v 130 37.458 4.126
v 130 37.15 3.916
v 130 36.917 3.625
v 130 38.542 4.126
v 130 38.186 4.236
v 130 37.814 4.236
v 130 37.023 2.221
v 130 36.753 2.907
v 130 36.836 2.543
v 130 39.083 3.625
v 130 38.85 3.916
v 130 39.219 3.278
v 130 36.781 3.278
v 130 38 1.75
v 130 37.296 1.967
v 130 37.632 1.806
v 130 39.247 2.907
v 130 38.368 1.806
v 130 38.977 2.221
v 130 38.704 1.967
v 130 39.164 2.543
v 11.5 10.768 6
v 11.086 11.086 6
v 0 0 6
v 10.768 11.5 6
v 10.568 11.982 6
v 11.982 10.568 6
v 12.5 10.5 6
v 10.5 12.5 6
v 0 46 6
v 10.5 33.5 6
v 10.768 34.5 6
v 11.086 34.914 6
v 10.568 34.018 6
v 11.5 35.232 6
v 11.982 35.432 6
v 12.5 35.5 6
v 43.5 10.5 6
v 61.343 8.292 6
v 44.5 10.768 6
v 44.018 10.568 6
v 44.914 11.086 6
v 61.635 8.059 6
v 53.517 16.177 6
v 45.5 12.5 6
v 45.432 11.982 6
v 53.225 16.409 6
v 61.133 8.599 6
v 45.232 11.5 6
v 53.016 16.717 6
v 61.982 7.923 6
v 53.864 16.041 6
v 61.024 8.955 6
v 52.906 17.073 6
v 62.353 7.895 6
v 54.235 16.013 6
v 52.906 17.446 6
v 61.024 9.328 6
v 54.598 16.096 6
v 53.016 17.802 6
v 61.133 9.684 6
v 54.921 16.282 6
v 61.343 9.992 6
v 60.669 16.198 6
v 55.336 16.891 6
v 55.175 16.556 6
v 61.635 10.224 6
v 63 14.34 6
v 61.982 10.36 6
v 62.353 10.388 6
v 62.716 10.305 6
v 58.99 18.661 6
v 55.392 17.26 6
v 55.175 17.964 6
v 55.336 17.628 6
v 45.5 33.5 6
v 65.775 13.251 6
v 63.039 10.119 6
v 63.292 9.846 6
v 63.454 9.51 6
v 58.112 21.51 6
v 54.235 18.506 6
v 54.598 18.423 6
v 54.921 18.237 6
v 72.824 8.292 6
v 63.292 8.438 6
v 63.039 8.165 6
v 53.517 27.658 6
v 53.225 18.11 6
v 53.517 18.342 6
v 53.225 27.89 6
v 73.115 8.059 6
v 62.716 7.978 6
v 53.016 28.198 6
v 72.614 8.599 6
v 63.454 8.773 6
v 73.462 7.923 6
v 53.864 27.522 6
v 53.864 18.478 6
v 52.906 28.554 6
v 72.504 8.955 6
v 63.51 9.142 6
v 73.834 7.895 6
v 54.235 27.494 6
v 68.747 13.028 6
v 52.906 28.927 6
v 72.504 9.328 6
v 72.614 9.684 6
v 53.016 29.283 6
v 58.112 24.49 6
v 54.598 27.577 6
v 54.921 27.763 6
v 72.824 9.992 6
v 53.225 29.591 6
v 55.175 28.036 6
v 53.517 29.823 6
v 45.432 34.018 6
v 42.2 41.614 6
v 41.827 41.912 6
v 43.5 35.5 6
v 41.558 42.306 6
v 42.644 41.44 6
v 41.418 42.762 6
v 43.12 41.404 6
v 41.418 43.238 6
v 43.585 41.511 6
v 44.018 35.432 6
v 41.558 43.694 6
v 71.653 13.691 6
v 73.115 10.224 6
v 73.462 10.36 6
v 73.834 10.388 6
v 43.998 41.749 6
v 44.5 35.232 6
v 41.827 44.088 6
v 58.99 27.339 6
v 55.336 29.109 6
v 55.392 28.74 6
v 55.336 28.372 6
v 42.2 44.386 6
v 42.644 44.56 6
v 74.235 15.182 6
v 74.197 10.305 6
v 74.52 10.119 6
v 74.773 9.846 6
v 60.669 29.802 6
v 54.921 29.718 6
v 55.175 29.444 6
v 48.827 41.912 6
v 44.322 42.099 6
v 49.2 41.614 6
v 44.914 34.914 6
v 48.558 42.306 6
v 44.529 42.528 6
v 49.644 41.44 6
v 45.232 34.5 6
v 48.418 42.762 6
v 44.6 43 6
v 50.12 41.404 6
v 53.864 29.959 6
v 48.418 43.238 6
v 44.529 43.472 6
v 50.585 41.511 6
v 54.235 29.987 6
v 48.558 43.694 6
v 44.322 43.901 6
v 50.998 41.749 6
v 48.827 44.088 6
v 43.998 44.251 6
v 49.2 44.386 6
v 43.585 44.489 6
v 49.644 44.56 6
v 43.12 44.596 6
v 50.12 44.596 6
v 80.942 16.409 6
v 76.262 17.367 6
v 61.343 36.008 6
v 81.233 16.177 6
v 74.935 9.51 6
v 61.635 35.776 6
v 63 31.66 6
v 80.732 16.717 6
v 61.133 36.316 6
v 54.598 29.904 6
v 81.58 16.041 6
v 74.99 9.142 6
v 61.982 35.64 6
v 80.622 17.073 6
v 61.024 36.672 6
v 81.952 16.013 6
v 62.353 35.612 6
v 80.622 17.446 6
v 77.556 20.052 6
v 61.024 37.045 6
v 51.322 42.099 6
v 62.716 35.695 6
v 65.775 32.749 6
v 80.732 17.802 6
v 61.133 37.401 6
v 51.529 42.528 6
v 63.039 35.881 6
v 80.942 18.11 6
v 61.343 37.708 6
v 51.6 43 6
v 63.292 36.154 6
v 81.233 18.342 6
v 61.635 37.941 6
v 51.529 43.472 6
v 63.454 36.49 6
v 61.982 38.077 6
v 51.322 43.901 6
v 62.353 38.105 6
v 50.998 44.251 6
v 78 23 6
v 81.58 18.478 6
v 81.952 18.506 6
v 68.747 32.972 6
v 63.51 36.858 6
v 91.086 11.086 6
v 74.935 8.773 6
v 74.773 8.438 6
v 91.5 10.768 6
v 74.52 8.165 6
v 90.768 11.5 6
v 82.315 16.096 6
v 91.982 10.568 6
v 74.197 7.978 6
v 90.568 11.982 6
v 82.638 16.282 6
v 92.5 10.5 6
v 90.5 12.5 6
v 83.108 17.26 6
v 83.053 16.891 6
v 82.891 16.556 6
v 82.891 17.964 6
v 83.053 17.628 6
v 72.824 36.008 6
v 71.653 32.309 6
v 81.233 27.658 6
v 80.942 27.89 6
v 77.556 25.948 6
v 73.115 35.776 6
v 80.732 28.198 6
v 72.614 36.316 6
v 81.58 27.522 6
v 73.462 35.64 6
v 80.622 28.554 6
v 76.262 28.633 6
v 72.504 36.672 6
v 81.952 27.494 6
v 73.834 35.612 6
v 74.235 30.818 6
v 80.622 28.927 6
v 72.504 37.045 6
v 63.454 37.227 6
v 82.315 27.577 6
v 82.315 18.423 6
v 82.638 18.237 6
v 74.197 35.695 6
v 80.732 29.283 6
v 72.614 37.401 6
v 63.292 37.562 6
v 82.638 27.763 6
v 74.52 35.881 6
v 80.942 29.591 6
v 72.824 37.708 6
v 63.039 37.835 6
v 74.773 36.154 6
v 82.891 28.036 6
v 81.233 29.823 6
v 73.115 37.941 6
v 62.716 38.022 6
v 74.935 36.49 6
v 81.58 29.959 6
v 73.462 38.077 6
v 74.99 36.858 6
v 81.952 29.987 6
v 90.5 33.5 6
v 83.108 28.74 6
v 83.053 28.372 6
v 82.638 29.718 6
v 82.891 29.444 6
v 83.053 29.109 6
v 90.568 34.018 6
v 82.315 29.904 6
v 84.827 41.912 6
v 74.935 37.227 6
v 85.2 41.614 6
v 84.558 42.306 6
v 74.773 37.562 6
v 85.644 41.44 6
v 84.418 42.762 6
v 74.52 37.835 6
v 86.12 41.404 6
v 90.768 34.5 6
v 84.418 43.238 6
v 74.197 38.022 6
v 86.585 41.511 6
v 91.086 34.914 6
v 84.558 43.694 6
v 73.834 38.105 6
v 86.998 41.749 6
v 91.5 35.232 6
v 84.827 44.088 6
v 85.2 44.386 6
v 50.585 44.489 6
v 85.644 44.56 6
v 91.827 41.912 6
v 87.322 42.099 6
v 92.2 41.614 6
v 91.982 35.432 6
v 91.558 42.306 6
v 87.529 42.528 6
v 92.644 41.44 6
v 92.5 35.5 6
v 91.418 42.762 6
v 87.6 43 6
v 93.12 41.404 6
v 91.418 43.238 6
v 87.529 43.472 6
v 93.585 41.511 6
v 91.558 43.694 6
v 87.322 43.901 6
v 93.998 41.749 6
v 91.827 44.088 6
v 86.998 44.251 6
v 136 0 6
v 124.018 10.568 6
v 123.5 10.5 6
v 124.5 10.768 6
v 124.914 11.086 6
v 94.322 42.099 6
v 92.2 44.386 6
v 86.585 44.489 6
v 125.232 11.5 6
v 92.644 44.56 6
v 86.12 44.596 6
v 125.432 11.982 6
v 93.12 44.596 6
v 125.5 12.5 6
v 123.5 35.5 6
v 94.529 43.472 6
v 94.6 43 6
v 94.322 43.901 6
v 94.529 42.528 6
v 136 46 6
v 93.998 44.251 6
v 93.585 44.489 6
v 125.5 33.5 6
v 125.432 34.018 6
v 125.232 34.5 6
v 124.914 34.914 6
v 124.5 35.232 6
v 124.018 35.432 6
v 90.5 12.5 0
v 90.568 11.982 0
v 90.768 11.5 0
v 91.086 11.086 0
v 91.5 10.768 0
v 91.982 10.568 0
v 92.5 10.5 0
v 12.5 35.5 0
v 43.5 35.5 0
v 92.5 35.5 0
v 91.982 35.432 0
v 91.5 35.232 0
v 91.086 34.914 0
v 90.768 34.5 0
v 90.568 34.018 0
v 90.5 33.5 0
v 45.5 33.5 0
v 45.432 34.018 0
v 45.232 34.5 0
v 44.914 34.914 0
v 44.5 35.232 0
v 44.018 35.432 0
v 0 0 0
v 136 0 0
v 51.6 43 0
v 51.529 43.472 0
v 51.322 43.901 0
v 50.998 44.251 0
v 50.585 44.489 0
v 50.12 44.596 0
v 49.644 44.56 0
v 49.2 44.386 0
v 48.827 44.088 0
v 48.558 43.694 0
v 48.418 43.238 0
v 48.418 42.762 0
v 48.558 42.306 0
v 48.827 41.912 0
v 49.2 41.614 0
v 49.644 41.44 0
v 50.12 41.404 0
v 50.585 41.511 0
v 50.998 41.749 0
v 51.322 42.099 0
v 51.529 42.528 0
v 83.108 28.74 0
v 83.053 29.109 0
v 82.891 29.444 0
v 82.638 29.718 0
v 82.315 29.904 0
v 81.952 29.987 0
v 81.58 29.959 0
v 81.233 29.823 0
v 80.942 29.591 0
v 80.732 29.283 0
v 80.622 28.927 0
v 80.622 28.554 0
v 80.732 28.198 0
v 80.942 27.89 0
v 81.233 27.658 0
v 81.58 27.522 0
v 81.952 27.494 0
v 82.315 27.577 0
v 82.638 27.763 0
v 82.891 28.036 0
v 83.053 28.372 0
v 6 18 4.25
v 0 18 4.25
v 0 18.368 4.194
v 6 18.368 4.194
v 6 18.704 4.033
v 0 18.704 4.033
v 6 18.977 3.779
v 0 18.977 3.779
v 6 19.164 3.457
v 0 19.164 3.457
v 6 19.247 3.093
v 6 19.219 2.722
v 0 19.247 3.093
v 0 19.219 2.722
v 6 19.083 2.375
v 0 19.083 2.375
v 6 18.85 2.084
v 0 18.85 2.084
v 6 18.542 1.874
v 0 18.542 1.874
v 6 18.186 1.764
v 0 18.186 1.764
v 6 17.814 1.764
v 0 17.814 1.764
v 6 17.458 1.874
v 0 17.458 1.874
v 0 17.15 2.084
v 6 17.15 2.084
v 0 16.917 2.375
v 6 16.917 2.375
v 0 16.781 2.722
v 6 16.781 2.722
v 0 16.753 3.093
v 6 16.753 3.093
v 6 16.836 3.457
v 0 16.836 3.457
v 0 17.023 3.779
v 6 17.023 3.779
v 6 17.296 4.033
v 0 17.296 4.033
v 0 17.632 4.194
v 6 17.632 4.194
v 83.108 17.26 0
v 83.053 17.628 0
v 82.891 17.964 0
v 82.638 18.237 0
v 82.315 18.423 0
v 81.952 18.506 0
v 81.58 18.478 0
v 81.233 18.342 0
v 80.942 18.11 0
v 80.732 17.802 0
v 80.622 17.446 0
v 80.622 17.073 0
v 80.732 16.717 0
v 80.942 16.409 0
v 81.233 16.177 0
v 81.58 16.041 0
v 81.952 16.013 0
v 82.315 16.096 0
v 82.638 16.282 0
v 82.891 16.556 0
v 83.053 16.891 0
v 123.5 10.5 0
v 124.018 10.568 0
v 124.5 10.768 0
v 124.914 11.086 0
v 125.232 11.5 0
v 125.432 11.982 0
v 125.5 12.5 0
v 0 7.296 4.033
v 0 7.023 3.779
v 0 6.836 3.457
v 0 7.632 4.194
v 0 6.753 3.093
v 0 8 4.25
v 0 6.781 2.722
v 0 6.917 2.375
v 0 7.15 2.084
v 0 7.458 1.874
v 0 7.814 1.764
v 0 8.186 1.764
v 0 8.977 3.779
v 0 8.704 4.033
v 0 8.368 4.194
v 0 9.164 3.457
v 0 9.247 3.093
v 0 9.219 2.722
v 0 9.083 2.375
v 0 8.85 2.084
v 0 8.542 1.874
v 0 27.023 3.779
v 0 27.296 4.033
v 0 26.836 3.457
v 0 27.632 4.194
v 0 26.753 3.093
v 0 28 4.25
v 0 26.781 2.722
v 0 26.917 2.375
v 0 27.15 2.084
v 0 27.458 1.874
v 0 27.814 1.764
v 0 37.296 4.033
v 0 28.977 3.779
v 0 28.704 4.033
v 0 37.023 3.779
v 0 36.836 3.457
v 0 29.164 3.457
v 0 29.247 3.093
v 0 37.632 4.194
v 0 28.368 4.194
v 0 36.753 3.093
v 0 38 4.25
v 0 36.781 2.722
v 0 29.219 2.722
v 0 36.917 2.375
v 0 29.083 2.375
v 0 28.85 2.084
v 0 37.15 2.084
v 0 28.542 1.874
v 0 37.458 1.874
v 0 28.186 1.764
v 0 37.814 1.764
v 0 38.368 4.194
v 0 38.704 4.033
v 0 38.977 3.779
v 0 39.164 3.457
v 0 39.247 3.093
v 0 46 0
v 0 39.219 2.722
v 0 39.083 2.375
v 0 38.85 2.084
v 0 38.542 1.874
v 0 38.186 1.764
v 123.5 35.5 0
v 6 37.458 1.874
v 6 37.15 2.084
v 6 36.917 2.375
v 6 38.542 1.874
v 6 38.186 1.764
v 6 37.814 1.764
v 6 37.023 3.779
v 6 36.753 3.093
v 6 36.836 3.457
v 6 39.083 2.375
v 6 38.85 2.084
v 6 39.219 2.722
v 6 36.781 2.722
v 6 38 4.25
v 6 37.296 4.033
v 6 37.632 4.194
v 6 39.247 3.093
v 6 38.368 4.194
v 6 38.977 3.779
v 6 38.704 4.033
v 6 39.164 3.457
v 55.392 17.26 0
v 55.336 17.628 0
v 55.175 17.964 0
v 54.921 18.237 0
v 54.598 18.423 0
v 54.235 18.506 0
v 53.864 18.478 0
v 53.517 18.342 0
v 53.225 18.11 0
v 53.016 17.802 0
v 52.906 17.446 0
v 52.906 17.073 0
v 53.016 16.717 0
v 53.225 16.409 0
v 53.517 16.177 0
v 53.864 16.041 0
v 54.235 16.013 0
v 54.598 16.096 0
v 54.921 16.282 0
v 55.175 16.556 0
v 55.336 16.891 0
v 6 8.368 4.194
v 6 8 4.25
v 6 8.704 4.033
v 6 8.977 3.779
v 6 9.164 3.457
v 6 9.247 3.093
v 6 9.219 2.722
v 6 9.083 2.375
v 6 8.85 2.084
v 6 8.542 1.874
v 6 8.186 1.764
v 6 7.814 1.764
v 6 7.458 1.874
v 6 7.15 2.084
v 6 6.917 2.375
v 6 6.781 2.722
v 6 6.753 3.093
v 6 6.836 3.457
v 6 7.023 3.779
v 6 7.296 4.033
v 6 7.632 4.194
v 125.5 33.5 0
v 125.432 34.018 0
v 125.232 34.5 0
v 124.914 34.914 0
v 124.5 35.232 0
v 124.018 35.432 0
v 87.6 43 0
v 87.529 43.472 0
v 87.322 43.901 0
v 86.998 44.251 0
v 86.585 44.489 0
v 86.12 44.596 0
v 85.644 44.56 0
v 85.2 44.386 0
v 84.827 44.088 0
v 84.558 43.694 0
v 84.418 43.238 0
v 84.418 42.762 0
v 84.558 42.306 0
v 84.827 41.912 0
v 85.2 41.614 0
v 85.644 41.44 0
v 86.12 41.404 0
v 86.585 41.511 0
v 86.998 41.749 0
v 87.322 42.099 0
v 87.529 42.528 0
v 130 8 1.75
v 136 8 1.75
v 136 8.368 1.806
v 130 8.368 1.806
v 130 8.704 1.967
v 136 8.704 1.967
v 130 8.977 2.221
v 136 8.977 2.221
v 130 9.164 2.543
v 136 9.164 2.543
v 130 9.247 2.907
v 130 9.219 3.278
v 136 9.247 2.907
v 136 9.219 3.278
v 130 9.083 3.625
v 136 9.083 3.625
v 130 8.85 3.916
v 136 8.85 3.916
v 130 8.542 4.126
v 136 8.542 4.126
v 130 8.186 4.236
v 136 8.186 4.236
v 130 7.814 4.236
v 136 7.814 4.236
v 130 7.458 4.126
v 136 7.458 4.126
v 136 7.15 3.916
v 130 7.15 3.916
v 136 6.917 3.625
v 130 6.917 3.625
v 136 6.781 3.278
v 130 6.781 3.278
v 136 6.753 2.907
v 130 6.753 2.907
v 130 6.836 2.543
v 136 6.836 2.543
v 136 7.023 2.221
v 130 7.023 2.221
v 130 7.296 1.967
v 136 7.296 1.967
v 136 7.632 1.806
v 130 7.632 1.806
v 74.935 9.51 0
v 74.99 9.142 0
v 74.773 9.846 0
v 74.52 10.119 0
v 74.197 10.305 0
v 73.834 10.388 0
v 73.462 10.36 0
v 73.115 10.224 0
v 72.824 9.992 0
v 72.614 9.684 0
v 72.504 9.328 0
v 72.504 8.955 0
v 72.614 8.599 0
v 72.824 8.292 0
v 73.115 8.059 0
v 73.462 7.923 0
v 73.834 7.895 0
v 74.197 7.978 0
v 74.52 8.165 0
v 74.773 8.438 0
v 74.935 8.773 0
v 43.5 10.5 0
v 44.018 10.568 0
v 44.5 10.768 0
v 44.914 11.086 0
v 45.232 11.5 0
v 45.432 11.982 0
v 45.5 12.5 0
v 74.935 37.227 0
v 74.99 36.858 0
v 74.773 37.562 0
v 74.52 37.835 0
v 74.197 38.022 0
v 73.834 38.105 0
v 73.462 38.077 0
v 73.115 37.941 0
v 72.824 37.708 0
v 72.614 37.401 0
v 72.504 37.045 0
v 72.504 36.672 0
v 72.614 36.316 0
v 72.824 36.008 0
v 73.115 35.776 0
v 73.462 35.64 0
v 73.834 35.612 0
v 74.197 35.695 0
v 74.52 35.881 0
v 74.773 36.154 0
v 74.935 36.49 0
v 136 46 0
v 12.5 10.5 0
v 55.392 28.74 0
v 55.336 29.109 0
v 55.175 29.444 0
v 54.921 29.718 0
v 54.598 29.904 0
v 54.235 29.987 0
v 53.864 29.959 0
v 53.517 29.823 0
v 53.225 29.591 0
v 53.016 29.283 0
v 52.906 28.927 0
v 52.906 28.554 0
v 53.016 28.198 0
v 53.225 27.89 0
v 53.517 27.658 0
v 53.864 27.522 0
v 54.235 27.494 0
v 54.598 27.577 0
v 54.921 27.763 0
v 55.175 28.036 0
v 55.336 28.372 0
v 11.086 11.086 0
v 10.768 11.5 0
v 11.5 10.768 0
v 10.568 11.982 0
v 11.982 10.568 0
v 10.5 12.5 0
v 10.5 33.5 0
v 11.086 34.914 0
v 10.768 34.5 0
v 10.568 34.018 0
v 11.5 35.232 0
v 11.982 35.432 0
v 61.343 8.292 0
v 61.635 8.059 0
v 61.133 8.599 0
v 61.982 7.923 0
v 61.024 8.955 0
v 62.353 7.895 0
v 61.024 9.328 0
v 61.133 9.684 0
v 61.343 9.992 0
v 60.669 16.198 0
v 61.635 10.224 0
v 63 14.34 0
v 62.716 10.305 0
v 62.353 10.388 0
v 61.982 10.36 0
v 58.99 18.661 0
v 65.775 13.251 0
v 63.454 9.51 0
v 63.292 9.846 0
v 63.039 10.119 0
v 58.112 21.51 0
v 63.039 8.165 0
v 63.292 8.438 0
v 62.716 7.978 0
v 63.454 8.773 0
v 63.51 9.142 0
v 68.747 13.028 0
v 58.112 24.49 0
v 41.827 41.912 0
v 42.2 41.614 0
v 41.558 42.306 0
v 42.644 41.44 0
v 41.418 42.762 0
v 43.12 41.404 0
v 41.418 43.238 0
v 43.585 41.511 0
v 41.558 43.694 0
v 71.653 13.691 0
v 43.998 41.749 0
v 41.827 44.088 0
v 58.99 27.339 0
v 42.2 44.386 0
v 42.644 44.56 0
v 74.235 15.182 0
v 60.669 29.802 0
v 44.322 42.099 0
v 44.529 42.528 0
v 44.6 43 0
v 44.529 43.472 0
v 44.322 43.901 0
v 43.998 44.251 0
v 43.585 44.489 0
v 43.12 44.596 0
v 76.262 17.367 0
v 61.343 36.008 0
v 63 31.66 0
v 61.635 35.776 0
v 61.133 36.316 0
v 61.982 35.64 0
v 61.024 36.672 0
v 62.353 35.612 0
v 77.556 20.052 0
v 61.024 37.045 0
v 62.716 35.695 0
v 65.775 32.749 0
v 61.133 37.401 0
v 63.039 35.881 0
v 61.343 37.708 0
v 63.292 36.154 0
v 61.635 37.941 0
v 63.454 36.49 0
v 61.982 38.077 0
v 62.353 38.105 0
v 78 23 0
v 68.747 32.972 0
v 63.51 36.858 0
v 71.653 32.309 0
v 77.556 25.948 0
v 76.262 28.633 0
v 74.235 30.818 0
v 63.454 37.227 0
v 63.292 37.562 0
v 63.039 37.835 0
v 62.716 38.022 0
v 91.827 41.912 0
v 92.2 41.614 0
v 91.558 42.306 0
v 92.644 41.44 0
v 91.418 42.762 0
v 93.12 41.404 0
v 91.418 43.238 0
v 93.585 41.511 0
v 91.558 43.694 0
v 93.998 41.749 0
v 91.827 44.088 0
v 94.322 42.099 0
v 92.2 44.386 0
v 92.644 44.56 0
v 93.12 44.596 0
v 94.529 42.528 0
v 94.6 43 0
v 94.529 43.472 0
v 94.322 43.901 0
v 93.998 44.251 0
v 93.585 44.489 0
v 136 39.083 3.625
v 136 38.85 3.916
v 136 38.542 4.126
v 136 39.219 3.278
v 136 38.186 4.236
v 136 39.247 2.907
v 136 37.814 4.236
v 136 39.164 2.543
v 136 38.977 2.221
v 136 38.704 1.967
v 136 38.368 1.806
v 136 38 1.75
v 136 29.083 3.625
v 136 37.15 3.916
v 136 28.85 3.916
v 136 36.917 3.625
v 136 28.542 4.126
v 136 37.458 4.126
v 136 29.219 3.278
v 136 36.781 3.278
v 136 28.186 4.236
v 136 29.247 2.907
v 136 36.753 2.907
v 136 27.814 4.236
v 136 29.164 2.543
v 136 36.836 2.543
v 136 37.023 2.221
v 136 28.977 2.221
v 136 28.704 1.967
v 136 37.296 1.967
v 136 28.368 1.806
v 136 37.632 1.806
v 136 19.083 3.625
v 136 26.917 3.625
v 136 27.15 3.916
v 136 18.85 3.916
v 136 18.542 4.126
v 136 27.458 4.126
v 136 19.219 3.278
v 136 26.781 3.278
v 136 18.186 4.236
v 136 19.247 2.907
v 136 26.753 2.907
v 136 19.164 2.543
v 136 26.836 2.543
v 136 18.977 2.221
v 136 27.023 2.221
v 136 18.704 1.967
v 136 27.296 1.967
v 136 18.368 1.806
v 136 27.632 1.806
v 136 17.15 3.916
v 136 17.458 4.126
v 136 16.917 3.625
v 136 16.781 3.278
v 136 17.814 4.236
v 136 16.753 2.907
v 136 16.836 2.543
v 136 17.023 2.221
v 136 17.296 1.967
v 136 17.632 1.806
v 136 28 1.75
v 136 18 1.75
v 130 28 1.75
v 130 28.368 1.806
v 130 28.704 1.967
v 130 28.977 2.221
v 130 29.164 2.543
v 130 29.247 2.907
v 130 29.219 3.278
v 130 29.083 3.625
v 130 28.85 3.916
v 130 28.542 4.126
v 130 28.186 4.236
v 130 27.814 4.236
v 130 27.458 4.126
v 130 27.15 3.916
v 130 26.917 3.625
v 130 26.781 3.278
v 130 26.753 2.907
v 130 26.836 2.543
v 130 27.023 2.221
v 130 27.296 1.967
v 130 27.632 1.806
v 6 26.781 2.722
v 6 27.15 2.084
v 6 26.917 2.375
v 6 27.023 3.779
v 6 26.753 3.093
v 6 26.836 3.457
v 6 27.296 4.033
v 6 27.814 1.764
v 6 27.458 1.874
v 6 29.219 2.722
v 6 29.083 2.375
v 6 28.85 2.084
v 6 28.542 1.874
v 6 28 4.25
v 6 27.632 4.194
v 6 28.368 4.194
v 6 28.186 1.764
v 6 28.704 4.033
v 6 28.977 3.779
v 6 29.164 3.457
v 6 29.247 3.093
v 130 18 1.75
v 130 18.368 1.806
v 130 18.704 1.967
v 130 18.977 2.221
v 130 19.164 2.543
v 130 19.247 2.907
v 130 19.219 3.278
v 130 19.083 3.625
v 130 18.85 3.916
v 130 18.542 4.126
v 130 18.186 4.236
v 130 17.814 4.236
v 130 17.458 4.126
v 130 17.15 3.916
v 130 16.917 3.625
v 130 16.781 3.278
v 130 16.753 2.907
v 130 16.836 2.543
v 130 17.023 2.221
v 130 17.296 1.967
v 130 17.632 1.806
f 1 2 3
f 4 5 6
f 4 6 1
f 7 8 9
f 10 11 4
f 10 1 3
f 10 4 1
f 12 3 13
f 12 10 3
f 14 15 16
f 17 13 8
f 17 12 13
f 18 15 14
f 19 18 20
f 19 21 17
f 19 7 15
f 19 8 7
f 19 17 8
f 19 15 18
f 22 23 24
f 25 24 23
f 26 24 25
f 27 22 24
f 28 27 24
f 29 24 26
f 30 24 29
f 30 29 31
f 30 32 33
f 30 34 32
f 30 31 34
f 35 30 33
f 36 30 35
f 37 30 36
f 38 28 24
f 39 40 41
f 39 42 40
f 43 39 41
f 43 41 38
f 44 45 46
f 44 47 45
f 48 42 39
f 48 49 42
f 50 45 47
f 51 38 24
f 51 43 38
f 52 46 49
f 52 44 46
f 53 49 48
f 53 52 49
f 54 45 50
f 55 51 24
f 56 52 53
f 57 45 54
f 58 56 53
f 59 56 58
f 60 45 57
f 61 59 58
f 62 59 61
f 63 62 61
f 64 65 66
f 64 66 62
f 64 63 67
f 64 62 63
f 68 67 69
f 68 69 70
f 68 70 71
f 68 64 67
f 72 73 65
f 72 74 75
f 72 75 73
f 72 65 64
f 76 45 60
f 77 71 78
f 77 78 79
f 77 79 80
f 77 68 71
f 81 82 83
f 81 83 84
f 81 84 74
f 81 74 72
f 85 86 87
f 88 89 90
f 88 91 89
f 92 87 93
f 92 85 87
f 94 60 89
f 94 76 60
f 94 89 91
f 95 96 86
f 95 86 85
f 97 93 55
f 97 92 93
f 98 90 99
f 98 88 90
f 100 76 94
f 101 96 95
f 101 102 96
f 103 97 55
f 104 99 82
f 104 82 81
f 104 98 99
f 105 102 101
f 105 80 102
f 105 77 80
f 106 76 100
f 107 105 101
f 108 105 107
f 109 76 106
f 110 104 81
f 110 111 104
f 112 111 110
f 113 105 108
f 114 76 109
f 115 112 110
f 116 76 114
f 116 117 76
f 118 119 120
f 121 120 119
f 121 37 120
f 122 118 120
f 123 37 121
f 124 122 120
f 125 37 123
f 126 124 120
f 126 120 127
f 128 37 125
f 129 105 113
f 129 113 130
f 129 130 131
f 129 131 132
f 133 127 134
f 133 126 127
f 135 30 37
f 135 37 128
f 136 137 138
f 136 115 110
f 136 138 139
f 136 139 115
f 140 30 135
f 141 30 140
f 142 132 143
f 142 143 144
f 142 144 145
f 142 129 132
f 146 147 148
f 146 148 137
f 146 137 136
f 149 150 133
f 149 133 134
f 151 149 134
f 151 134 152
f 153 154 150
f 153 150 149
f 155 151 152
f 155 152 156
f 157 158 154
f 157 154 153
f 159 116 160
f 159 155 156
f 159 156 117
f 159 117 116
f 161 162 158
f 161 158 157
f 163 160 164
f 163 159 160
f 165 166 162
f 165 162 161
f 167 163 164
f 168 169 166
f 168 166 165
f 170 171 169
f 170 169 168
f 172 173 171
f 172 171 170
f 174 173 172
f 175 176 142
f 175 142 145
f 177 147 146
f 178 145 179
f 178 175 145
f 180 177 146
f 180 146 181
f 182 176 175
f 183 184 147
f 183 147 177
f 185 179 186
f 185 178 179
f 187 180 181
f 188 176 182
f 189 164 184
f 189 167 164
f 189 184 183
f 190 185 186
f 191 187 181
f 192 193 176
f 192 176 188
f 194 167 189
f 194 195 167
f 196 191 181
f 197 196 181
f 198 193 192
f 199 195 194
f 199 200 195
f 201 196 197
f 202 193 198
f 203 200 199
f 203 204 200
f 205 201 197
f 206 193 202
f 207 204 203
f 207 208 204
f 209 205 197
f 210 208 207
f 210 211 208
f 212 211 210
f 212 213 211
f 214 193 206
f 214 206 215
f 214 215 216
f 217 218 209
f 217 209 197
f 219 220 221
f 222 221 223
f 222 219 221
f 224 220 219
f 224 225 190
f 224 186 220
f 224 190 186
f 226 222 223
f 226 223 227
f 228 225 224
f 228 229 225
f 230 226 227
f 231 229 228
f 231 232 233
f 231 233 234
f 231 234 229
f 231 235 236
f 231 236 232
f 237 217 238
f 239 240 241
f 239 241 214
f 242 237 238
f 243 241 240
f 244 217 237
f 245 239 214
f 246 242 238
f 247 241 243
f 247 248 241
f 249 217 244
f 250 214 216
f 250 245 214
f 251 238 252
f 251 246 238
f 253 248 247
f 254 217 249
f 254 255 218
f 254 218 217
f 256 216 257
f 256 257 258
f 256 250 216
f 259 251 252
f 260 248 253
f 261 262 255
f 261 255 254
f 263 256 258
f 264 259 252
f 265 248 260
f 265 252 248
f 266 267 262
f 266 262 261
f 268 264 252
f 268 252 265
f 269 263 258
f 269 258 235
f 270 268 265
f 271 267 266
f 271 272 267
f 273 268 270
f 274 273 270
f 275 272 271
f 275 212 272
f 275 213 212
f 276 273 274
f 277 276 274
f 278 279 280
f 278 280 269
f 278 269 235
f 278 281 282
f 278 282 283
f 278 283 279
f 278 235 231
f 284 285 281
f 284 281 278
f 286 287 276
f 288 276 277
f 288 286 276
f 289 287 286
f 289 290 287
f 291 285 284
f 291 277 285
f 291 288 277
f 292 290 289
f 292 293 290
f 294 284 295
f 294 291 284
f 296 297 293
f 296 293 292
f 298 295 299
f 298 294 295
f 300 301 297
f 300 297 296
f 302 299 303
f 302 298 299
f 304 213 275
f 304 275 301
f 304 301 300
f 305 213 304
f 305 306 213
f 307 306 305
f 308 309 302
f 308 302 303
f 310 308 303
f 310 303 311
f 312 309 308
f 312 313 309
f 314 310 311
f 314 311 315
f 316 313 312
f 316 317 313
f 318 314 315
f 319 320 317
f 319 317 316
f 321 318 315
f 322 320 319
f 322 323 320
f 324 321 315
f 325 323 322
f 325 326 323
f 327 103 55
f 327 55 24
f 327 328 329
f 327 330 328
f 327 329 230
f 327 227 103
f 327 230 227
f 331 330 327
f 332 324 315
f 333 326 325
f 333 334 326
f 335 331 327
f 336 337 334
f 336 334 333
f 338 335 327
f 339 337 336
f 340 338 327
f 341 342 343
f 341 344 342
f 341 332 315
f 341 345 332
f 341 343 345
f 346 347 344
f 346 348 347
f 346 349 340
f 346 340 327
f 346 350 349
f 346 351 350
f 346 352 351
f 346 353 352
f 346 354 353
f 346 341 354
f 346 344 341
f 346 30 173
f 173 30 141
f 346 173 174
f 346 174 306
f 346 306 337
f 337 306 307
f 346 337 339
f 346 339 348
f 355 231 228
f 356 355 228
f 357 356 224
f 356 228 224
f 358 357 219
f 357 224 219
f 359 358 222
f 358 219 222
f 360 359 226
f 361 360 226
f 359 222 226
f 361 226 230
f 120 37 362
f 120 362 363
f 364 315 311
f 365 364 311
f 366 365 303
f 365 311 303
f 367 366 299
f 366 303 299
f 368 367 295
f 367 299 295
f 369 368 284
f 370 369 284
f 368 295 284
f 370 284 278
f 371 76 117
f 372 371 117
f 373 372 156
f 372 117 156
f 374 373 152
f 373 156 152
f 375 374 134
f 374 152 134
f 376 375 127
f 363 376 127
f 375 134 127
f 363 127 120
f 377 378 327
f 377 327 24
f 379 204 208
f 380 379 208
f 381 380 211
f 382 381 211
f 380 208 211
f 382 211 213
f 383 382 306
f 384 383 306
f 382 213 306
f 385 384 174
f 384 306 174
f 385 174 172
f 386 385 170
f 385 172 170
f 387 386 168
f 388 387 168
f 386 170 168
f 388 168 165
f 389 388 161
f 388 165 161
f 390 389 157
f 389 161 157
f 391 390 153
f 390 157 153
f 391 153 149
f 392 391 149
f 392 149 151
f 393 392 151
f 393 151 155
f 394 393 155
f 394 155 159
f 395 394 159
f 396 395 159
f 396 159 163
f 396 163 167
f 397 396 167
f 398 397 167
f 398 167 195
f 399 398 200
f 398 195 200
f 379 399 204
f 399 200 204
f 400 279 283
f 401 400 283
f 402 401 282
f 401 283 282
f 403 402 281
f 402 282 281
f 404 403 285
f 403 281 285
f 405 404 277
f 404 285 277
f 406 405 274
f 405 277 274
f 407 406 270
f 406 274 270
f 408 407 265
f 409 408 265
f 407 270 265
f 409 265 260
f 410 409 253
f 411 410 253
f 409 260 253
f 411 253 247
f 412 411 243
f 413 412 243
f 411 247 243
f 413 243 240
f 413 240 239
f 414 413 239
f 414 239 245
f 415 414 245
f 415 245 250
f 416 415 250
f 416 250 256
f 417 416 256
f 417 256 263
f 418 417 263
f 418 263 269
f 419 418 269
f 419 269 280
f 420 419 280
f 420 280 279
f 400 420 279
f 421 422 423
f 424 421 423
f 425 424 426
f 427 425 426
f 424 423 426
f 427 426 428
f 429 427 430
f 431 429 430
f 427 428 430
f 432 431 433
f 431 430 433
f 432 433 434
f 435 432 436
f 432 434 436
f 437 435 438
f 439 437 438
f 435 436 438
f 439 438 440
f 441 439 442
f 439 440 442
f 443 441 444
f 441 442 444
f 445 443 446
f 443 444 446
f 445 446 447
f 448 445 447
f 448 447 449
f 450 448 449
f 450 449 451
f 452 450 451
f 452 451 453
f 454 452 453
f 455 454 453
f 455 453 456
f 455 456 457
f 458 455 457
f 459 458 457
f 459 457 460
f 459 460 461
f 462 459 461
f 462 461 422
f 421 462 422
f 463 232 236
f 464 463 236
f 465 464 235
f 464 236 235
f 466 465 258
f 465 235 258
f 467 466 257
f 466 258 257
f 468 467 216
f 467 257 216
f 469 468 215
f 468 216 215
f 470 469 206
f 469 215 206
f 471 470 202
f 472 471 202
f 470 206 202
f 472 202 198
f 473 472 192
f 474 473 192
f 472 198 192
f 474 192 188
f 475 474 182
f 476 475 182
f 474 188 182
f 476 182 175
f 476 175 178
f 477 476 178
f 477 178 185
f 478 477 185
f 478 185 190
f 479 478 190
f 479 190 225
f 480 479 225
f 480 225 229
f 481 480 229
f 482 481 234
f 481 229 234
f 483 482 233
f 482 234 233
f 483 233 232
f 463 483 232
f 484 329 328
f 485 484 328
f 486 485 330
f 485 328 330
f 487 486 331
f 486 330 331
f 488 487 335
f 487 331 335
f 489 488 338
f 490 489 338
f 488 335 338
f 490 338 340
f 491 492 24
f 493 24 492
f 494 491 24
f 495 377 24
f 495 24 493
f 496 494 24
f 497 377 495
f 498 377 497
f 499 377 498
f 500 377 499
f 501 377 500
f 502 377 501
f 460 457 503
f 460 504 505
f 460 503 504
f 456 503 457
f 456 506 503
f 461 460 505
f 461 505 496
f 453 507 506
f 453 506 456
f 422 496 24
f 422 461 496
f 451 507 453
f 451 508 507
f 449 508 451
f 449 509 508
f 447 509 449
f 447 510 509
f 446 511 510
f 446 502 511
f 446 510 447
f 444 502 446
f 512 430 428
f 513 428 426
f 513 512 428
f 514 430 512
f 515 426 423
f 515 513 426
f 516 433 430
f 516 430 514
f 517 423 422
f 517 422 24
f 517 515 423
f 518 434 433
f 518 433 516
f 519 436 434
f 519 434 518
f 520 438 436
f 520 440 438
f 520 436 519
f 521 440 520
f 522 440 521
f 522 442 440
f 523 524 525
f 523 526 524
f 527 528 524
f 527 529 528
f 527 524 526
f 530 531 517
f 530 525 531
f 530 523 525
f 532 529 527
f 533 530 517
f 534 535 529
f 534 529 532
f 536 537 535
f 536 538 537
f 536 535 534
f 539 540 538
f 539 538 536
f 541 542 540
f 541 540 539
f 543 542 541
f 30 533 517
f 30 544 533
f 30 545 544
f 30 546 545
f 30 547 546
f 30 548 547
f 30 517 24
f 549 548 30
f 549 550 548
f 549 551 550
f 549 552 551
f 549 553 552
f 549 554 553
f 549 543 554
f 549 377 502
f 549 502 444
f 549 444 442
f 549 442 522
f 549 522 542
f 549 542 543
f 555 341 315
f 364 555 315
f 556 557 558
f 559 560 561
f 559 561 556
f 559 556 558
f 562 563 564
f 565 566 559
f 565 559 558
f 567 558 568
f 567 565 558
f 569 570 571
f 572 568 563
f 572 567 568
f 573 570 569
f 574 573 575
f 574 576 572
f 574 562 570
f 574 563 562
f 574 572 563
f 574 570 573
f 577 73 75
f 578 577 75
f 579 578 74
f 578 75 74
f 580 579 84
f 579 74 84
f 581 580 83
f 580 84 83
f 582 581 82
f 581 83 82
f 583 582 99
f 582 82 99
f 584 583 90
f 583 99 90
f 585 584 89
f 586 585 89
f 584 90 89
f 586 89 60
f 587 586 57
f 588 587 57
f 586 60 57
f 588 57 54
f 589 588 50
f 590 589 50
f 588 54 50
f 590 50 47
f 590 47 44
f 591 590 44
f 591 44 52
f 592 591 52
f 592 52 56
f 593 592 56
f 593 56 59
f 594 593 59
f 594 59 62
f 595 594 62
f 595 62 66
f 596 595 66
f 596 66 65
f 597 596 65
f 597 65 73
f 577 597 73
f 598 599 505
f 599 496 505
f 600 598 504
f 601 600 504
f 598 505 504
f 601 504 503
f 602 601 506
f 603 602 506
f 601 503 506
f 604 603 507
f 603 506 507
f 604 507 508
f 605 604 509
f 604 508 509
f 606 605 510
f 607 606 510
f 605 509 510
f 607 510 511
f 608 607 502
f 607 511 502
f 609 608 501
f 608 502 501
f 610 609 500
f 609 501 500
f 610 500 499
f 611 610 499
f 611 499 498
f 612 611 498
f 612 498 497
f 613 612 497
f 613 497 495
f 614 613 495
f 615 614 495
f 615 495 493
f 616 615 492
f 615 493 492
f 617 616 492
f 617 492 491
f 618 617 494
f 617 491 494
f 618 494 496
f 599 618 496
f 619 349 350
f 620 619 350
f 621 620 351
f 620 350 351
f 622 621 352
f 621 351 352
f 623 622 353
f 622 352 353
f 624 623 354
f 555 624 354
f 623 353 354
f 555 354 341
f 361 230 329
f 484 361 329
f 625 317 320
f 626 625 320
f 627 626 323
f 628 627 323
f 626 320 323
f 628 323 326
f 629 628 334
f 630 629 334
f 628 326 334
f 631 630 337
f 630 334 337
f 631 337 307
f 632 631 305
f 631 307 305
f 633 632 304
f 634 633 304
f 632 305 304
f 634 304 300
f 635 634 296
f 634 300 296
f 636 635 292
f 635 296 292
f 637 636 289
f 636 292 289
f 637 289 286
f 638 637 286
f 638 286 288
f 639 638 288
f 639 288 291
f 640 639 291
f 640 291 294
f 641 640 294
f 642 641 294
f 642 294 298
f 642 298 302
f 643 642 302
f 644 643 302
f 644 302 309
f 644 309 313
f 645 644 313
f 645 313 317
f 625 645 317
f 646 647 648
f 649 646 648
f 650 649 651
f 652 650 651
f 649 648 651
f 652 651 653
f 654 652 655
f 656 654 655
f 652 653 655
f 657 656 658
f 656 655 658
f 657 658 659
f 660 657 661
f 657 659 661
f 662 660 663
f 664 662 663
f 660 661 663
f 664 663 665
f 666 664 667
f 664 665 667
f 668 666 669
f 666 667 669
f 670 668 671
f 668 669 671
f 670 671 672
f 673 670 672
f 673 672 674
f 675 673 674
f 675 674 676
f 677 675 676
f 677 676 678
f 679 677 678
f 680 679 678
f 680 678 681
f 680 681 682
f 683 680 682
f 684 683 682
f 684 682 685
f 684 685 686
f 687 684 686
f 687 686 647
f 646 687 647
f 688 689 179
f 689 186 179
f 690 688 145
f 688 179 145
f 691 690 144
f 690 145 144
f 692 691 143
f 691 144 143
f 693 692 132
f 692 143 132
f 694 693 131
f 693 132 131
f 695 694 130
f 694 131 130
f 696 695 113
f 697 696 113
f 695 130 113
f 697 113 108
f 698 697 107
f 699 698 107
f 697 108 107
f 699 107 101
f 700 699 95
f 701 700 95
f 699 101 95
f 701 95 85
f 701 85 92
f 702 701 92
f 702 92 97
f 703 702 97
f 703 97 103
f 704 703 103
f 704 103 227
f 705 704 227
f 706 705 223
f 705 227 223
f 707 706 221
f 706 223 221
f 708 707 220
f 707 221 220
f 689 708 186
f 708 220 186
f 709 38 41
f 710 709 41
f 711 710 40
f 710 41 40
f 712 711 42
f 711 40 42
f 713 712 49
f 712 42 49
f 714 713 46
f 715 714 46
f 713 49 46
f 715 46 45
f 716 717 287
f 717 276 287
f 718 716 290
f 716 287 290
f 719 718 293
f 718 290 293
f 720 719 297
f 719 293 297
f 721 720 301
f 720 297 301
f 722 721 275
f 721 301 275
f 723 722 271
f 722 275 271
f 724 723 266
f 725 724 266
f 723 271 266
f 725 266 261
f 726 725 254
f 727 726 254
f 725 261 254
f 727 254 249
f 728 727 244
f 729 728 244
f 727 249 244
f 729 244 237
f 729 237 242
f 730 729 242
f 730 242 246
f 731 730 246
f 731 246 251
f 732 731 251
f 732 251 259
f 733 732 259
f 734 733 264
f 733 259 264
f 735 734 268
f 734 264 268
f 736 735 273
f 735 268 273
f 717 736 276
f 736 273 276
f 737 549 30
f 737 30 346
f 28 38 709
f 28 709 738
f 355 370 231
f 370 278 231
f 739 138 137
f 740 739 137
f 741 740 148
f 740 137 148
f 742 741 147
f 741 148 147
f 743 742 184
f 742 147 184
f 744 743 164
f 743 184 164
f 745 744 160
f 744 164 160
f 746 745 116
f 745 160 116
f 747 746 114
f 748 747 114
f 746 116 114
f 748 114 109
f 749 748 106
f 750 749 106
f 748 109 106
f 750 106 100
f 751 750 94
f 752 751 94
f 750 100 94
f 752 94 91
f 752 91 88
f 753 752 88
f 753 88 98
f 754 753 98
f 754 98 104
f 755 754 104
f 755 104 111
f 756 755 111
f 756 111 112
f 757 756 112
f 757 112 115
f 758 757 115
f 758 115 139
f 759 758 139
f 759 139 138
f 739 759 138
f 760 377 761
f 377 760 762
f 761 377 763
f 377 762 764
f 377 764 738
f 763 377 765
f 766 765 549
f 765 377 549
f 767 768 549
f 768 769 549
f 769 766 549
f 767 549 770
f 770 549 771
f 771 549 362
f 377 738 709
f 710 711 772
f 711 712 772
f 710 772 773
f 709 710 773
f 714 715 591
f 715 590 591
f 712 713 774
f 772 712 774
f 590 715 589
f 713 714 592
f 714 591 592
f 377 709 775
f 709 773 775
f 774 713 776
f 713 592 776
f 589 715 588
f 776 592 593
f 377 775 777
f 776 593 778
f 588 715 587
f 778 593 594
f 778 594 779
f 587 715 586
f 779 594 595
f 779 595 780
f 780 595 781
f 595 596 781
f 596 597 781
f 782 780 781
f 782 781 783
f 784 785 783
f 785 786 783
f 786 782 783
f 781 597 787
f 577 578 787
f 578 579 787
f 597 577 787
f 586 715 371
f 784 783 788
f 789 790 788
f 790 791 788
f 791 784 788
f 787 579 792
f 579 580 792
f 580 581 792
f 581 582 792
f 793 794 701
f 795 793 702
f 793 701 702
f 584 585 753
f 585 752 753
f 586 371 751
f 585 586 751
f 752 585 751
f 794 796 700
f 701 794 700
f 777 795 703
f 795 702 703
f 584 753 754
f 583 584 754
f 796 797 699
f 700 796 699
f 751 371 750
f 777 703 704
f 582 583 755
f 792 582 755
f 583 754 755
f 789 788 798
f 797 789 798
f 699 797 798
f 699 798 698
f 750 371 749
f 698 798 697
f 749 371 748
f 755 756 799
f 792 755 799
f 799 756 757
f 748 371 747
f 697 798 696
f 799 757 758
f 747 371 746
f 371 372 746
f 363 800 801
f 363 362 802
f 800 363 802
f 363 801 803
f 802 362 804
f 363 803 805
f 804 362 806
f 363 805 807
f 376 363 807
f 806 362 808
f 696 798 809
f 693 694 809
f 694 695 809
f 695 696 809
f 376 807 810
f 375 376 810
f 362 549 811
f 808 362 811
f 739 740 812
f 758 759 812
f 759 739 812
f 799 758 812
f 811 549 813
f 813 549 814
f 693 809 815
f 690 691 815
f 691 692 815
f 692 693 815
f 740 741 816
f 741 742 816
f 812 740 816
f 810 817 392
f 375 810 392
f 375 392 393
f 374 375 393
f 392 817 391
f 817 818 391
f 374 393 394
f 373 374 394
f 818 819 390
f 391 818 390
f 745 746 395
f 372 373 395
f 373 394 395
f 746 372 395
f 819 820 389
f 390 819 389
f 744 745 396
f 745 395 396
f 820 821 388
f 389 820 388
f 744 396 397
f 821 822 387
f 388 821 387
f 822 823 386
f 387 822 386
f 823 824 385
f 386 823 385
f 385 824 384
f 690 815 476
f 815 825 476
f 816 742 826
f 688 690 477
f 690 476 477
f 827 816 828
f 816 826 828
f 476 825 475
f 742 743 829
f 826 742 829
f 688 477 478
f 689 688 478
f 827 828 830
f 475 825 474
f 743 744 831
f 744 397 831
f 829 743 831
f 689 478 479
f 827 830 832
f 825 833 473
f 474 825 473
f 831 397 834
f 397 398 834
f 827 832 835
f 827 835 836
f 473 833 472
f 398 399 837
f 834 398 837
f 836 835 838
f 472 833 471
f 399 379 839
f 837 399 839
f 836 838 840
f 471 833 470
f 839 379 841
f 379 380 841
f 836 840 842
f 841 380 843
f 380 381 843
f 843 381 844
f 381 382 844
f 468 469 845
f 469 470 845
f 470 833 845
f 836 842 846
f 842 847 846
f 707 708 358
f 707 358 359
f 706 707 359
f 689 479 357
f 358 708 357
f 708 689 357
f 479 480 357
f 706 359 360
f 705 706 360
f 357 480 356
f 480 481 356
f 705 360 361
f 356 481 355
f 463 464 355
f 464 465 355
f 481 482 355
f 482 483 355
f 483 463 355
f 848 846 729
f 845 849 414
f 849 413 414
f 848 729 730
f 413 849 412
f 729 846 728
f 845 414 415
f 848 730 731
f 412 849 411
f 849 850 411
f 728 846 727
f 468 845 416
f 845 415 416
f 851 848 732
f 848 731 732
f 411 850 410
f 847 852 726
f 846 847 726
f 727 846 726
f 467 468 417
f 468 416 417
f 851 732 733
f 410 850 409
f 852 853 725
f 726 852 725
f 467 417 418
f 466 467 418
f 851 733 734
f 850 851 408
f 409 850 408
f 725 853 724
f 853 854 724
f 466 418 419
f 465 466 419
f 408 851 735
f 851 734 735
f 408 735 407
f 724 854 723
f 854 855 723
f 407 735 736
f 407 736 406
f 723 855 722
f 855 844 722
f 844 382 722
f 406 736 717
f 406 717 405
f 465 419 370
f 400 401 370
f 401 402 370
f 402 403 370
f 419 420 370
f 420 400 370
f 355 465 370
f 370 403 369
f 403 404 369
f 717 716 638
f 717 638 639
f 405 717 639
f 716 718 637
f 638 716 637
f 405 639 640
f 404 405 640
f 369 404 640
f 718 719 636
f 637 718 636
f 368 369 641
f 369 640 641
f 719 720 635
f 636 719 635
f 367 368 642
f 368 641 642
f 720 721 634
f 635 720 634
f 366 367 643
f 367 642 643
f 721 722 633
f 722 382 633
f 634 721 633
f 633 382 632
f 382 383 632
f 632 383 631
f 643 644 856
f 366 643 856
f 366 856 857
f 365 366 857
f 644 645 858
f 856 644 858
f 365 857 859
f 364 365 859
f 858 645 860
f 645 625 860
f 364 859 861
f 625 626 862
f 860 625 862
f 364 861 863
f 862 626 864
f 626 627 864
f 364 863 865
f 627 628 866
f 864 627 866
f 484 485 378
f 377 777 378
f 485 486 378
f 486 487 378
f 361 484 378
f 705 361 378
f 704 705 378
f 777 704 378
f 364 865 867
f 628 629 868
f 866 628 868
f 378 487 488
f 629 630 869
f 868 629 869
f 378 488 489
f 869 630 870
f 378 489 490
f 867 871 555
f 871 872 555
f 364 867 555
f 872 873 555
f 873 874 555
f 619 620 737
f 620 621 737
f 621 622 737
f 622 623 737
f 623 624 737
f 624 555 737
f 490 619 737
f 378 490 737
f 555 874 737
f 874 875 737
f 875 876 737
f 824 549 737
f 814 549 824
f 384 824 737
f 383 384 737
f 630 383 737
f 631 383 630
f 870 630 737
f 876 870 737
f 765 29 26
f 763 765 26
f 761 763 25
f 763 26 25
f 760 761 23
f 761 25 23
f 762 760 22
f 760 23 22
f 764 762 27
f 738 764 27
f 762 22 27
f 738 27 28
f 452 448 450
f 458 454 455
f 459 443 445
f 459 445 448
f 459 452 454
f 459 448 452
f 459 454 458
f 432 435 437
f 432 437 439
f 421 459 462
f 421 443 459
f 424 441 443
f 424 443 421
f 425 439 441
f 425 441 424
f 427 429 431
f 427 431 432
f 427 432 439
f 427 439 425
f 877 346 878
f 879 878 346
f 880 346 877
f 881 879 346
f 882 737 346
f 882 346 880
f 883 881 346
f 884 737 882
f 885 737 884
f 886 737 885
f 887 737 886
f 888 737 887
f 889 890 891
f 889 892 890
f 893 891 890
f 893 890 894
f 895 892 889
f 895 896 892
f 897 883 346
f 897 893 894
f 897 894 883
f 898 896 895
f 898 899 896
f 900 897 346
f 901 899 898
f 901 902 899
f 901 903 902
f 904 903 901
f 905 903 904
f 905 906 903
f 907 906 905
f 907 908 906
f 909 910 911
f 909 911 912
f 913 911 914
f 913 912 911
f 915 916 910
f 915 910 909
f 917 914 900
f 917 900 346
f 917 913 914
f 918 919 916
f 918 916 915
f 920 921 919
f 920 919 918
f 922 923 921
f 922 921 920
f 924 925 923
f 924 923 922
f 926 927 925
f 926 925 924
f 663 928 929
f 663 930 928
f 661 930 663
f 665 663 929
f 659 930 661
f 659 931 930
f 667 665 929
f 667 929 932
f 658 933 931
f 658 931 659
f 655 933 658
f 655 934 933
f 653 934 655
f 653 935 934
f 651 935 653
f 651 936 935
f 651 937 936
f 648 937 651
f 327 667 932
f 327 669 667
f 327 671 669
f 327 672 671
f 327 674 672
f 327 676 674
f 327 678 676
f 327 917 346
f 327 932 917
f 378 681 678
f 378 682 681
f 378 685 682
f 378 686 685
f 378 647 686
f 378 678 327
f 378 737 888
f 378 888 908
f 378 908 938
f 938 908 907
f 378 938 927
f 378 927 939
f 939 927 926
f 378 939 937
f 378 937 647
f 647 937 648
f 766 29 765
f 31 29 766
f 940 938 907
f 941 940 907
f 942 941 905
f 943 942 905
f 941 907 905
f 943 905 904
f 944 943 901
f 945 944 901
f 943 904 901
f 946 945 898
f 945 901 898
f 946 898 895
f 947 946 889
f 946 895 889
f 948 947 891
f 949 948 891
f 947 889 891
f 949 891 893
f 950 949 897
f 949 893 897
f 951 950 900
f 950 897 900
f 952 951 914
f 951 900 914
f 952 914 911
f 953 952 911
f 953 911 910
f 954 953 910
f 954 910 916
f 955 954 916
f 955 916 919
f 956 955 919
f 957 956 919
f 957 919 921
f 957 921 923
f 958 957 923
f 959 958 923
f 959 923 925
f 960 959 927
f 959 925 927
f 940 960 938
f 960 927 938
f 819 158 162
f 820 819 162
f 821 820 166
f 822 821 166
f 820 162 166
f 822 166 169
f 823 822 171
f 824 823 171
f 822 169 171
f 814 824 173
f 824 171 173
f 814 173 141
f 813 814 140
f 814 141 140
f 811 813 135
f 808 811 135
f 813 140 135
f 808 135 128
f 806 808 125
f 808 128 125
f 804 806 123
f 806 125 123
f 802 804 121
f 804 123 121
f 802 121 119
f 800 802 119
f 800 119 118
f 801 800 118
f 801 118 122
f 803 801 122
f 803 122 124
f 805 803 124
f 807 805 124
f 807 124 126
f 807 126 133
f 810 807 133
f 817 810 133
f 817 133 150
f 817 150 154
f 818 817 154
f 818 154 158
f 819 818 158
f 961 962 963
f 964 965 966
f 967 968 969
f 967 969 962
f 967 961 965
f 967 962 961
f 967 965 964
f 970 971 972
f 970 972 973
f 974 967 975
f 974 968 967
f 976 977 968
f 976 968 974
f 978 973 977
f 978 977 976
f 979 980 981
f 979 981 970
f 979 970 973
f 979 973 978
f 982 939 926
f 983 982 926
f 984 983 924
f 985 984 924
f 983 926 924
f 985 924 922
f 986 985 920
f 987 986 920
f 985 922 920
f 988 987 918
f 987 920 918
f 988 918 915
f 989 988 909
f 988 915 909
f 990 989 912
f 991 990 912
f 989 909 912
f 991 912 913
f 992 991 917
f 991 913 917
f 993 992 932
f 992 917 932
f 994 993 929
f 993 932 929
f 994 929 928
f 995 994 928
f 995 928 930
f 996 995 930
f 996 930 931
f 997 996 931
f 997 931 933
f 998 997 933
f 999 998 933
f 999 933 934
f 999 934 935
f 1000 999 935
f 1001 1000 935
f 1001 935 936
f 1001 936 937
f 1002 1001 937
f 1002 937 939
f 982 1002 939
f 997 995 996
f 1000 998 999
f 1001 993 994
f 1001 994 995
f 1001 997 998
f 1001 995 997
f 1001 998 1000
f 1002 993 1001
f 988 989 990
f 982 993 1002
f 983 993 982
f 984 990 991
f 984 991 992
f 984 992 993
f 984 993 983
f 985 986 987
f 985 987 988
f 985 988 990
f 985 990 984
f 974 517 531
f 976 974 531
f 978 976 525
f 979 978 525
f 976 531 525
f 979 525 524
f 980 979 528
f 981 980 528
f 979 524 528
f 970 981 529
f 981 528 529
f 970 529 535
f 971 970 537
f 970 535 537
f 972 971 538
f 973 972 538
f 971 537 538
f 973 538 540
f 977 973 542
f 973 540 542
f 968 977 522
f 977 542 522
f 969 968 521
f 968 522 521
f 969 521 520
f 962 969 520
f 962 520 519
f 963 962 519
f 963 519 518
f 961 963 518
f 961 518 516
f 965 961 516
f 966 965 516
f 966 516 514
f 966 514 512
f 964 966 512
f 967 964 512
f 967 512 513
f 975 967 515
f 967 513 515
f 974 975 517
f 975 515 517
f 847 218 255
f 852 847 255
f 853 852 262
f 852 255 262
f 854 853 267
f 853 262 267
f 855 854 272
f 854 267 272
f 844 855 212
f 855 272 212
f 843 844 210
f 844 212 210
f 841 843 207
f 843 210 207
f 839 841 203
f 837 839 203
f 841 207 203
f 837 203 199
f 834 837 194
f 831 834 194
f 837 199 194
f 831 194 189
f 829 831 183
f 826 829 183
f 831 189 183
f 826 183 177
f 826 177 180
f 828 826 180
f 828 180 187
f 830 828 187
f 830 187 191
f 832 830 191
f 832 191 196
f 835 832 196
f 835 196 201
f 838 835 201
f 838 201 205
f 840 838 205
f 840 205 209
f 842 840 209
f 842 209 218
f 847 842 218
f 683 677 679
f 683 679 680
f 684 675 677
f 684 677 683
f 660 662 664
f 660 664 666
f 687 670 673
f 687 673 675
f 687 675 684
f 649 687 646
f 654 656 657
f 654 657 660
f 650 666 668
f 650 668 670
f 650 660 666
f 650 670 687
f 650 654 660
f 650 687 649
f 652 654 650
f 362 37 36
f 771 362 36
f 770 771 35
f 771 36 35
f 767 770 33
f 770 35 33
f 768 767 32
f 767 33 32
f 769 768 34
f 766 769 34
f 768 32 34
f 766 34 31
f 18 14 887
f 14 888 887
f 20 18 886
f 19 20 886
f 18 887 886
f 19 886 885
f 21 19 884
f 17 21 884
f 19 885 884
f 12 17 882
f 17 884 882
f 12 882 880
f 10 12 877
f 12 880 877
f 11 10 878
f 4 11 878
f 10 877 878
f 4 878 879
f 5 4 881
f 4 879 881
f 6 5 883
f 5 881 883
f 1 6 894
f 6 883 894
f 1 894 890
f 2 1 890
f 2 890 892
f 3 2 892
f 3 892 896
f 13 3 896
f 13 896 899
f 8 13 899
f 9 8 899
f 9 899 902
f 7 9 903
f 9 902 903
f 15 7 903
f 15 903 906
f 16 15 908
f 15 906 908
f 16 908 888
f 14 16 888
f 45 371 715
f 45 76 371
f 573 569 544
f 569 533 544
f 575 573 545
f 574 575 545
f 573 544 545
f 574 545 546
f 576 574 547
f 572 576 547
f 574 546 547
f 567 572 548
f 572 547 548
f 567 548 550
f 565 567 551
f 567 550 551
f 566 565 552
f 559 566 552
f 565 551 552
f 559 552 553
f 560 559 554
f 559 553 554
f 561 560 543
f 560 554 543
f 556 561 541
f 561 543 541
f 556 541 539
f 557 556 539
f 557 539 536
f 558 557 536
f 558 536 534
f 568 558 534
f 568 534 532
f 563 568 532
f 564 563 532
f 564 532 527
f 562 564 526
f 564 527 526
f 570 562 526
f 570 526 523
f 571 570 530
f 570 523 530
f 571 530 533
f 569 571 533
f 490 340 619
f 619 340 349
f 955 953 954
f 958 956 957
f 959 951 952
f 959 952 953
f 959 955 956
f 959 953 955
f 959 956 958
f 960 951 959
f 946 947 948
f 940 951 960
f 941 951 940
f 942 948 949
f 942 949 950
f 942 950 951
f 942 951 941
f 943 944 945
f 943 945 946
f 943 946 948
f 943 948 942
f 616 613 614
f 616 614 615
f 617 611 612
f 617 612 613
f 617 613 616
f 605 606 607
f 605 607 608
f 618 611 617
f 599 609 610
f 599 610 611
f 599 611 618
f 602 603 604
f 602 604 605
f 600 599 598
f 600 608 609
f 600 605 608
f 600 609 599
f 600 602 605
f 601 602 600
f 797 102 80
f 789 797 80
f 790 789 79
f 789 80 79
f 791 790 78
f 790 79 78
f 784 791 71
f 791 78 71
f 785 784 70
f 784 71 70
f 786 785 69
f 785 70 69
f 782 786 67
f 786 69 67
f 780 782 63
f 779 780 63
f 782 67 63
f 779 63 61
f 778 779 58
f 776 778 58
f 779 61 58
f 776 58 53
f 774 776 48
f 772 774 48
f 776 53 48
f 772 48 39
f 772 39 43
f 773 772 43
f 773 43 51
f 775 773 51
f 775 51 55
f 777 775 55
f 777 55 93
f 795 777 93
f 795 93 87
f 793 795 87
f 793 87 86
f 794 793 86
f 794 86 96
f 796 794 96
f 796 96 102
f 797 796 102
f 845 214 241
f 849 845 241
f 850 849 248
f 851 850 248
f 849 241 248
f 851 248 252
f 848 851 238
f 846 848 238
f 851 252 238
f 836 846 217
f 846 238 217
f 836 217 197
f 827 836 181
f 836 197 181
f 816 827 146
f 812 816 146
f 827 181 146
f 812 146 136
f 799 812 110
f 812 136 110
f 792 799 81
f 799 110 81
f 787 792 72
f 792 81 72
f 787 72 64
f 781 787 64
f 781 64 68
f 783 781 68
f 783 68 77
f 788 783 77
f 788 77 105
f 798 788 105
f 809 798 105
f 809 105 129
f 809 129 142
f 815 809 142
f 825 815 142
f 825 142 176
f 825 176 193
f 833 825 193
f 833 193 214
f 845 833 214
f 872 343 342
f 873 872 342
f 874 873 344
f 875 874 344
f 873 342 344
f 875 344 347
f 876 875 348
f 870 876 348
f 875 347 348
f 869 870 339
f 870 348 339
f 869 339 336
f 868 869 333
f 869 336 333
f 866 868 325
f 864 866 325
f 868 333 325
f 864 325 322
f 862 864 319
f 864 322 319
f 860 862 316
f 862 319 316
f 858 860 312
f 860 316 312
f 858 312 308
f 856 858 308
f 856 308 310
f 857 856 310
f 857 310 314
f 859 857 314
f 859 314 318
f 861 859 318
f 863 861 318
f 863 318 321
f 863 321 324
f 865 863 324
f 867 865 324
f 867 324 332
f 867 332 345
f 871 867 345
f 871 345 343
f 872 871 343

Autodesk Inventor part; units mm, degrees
ref_plane "YZ Plane" through (0, 0, 0) normal (1, 0, 0) x (0, 1, 0)
ref_plane "XZ Plane" through (0, 0, 0) normal (0, 1, 0) x (-1, 0, 0)
ref_plane "XY Plane" through (0, 0, 0) normal (0, 0, 1) x (1, 0, 0)
sketch "스케치1" plane through (0, 0, 0) normal (0, 0, 1) x (1, 0, 0)
  line L0 (0, 0) -> (0, 46)
  line L1 (0, 46) -> (136, 46)
  line L2 (136, 46) -> (136, 0)
  line L3 (136, 0) -> (0, 0)
  dimension "d0" = 46
  dimension "d1" = 136
extrude "돌출1" add sketch "스케치1" along normal blind 6
sketch "스케치2" plane through (0, 0, 6) normal (0, 0, 1) x (1, 0, 0)
  line L0 (0, 46) -> (0, 0) projected
  line L1 (0, 23) -> (136, 23) construction
  line L2 (136, 0) -> (136, 46) projected
  line L3 (136, 46) -> (0, 46) projected
  line L4 (68, 46) -> (68, 0) construction
  line L5 (0, 0) -> (136, 0) projected
  circle A0 centre (68, 23) radius 14
  line L6 (68, 23) -> (62.2597, 36.8582)
  line L7 (68.3516, 23) -> (83.3516, 23) construction
  circle A1 centre (62.2597, 36.8582) radius 1.25
  circle A2 centre (54.1418, 28.7403) radius 1.25
  circle A3 centre (54.1418, 17.2597) radius 1.25
  circle A4 centre (62.2597, 9.1418) radius 1.25
  circle A5 centre (73.7403, 9.1418) radius 1.25
  circle A6 centre (81.8582, 17.2597) radius 1.25
  circle A7 centre (81.8582, 28.7403) radius 1.25
  circle A8 centre (73.7403, 36.8582) radius 1.25
  circle A9 centre (68, 23) radius 0.245
  dimension "d30" = 28
  dimension "d31" = 15
  dimension "d32" = 112.5
  dimension "d33" = 2.5
  dimension "d34" = 360
extrude "돌출2" cut sketch "스케치2" against normal blind 6 contours A7 A0 | A0 A7 | A6 A0 | A0 A6 | A8 A0 | A0 A8 | A5 A0 | A0 A5 | A1 L6 A0 | A0 A1 | A4 A0 | A0 A4 | L6 A1 A0 | A3 A0 | A0 A3 | A2 A0 | A0 A2
sketch "스케치3" plane through (0, 0, 6) normal (0, 0, 1) x (1, 0, 0)
  line L0 (0, 46) -> (0, 0) projected
  line L1 (0, 23) -> (136, 23) construction
  line L2 (136, 0) -> (136, 46) projected
  line L3 (136, 46) -> (0, 46) projected
  line L4 (68, 46) -> (68, 0) construction
  line L5 (0, 0) -> (136, 0) projected
  circle A0 centre (68, 23) radius 10
  dimension "d13" = 20
extrude "돌출3" cut sketch "스케치3" against normal blind 6 contours A0
sketch "스케치4" plane through (136, 0, 0) normal (1, 0, 0) x (0, 0, -1)
  line L0 (0, 0) -> (-6, 0) projected
  line L1 (-3, 0) -> (-3, 46) construction
  line L2 (0, 46) -> (-6, 46) projected
  circle A0 centre (-3, 38) radius 1.25
  circle A1 centre (-3, 28) radius 1.25
  circle A2 centre (-3, 18) radius 1.25
  circle A3 centre (-3, 8) radius 1.25
  dimension "d16" = 2.5
  dimension "d17" = 2.5
  dimension "d18" = 2.5
  dimension "d19" = 2.5
  dimension "d20" = 10
  dimension "d21" = 10
  dimension "d22" = 10
  dimension "d23" = 8
extrude "돌출4" cut sketch "스케치4" against normal blind 6
sketch "스케치5" plane through (0, 0, 0) normal (-1, 0, 0) x (0, 0, 1)
  line L0 (0, 46) -> (6, 46) projected
  line L1 (0, 0) -> (6, 0) projected
  circle A0 centre (3, 38) radius 1.25 projected
  circle A1 centre (3, 28) radius 1.25 projected
  circle A2 centre (3, 18) radius 1.25 projected
  circle A3 centre (3, 8) radius 1.25 projected
extrude "돌출5" cut sketch "스케치5" against normal blind 6
sketch "스케치6" plane through (0, 0, 6) normal (0, 0, 1) x (1, 0, 0)
  circle A0 centre (68, 23) radius 10 projected
  circle A1 centre (81.8582, 17.2597) radius 1.25 projected
  circle A2 centre (54.1418, 28.7403) radius 1.25 projected
  circle A3 centre (54.1418, 17.2597) radius 1.25 projected
  circle A4 centre (73.7403, 36.8582) radius 1.25 projected
  circle A5 centre (73.7403, 9.1418) radius 1.25 projected
  circle A6 centre (62.2597, 36.8582) radius 1.25 projected
  circle A7 centre (62.2597, 9.1418) radius 1.25 projected
  circle A8 centre (81.8582, 28.7403) radius 1.25 projected
  line L0 (136, 46) -> (0, 46) projected
  line L1 (0, 46) -> (0, 0) projected
  line L2 (0, 0) -> (136, 0) projected
  line L3 (136, 0) -> (136, 46) projected
  line L4 (12.5, 35.5) -> (43.5, 35.5)
  line L5 (45.5, 33.5) -> (45.5, 12.5)
  line L6 (43.5, 10.5) -> (12.5, 10.5)
  line L7 (10.5, 12.5) -> (10.5, 33.5)
  line L8 (136, 46) -> (0, 46) projected
  line L9 (68, 46) -> (68, 0) construction
  line L10 (0, 0) -> (136, 0) projected
  line L11 (123.5, 35.5) -> (92.5, 35.5)
  line L12 (90.5, 33.5) -> (90.5, 12.5)
  line L13 (92.5, 10.5) -> (123.5, 10.5)
  line L14 (125.5, 12.5) -> (125.5, 33.5)
  arc A9 (45.5, 33.5) -> (43.5, 35.5) centre (43.5, 33.5) ccw
  arc A10 (43.5, 10.5) -> (45.5, 12.5) centre (43.5, 12.5) ccw
  arc A11 (10.5, 12.5) -> (12.5, 10.5) centre (12.5, 12.5) ccw
  arc A12 (92.5, 35.5) -> (90.5, 33.5) centre (92.5, 33.5) ccw
  arc A13 (125.5, 33.5) -> (123.5, 35.5) centre (123.5, 33.5) ccw
  arc A14 (123.5, 10.5) -> (125.5, 12.5) centre (123.5, 12.5) ccw
  arc A15 (90.5, 12.5) -> (92.5, 10.5) centre (92.5, 12.5) ccw
  arc A16 (12.5, 35.5) -> (10.5, 33.5) centre (12.5, 33.5) ccw
  point P0 (10.5, 35.5)
  point P1 (45.5, 10.5)
  point P2 (45.5, 35.5)
  point P3 (10.5, 10.5)
  point P4 (125.5, 35.5)
  point P5 (90.5, 10.5)
  point P6 (90.5, 35.5)
  point P7 (125.5, 10.5)
  dimension "d35" = 35
  dimension "d36" = 25
  dimension "d37" = 10.5
  dimension "d38" = 10.5
  dimension "d41" = 2
  dimension "d42" = 2
extrude "돌출6" cut sketch "스케치6" against normal blind 6 contours L4 A9 L5 A10 L6 A11 L7 A16 | A13 L14 A14 L13 A15 L12 A12 L11
sketch "스케치11" plane through (0, 0, 6) normal (0, 0, 1) x (1, 0, 0)
  line L0 (136, 46) -> (0, 46) projected
  line L1 (68, 46) -> (68, 43)
  line L2 (136, 43) -> (0, 43) construction
  circle A0 centre (50, 43) radius 1.6
  circle A1 centre (86, 43) radius 1.6
  circle A2 centre (43, 43) radius 1.6
  circle A3 centre (93, 43) radius 1.6
  point P0 (0, 0)
  dimension "d67" = 3
  dimension "d69" = 3
  dimension "d70" = 3.2
  dimension "d71" = 3.2
  dimension "d72" = 18
  dimension "d73" = 18
  dimension "d74" = 3.2
  dimension "d75" = 3.2
  dimension "d76" = 7
  dimension "d77" = 7
extrude "돌출8" cut sketch "스케치11" against normal blind 10
properties part number "조인트3힌지윗판_6T" material "알루미늄 6061"
